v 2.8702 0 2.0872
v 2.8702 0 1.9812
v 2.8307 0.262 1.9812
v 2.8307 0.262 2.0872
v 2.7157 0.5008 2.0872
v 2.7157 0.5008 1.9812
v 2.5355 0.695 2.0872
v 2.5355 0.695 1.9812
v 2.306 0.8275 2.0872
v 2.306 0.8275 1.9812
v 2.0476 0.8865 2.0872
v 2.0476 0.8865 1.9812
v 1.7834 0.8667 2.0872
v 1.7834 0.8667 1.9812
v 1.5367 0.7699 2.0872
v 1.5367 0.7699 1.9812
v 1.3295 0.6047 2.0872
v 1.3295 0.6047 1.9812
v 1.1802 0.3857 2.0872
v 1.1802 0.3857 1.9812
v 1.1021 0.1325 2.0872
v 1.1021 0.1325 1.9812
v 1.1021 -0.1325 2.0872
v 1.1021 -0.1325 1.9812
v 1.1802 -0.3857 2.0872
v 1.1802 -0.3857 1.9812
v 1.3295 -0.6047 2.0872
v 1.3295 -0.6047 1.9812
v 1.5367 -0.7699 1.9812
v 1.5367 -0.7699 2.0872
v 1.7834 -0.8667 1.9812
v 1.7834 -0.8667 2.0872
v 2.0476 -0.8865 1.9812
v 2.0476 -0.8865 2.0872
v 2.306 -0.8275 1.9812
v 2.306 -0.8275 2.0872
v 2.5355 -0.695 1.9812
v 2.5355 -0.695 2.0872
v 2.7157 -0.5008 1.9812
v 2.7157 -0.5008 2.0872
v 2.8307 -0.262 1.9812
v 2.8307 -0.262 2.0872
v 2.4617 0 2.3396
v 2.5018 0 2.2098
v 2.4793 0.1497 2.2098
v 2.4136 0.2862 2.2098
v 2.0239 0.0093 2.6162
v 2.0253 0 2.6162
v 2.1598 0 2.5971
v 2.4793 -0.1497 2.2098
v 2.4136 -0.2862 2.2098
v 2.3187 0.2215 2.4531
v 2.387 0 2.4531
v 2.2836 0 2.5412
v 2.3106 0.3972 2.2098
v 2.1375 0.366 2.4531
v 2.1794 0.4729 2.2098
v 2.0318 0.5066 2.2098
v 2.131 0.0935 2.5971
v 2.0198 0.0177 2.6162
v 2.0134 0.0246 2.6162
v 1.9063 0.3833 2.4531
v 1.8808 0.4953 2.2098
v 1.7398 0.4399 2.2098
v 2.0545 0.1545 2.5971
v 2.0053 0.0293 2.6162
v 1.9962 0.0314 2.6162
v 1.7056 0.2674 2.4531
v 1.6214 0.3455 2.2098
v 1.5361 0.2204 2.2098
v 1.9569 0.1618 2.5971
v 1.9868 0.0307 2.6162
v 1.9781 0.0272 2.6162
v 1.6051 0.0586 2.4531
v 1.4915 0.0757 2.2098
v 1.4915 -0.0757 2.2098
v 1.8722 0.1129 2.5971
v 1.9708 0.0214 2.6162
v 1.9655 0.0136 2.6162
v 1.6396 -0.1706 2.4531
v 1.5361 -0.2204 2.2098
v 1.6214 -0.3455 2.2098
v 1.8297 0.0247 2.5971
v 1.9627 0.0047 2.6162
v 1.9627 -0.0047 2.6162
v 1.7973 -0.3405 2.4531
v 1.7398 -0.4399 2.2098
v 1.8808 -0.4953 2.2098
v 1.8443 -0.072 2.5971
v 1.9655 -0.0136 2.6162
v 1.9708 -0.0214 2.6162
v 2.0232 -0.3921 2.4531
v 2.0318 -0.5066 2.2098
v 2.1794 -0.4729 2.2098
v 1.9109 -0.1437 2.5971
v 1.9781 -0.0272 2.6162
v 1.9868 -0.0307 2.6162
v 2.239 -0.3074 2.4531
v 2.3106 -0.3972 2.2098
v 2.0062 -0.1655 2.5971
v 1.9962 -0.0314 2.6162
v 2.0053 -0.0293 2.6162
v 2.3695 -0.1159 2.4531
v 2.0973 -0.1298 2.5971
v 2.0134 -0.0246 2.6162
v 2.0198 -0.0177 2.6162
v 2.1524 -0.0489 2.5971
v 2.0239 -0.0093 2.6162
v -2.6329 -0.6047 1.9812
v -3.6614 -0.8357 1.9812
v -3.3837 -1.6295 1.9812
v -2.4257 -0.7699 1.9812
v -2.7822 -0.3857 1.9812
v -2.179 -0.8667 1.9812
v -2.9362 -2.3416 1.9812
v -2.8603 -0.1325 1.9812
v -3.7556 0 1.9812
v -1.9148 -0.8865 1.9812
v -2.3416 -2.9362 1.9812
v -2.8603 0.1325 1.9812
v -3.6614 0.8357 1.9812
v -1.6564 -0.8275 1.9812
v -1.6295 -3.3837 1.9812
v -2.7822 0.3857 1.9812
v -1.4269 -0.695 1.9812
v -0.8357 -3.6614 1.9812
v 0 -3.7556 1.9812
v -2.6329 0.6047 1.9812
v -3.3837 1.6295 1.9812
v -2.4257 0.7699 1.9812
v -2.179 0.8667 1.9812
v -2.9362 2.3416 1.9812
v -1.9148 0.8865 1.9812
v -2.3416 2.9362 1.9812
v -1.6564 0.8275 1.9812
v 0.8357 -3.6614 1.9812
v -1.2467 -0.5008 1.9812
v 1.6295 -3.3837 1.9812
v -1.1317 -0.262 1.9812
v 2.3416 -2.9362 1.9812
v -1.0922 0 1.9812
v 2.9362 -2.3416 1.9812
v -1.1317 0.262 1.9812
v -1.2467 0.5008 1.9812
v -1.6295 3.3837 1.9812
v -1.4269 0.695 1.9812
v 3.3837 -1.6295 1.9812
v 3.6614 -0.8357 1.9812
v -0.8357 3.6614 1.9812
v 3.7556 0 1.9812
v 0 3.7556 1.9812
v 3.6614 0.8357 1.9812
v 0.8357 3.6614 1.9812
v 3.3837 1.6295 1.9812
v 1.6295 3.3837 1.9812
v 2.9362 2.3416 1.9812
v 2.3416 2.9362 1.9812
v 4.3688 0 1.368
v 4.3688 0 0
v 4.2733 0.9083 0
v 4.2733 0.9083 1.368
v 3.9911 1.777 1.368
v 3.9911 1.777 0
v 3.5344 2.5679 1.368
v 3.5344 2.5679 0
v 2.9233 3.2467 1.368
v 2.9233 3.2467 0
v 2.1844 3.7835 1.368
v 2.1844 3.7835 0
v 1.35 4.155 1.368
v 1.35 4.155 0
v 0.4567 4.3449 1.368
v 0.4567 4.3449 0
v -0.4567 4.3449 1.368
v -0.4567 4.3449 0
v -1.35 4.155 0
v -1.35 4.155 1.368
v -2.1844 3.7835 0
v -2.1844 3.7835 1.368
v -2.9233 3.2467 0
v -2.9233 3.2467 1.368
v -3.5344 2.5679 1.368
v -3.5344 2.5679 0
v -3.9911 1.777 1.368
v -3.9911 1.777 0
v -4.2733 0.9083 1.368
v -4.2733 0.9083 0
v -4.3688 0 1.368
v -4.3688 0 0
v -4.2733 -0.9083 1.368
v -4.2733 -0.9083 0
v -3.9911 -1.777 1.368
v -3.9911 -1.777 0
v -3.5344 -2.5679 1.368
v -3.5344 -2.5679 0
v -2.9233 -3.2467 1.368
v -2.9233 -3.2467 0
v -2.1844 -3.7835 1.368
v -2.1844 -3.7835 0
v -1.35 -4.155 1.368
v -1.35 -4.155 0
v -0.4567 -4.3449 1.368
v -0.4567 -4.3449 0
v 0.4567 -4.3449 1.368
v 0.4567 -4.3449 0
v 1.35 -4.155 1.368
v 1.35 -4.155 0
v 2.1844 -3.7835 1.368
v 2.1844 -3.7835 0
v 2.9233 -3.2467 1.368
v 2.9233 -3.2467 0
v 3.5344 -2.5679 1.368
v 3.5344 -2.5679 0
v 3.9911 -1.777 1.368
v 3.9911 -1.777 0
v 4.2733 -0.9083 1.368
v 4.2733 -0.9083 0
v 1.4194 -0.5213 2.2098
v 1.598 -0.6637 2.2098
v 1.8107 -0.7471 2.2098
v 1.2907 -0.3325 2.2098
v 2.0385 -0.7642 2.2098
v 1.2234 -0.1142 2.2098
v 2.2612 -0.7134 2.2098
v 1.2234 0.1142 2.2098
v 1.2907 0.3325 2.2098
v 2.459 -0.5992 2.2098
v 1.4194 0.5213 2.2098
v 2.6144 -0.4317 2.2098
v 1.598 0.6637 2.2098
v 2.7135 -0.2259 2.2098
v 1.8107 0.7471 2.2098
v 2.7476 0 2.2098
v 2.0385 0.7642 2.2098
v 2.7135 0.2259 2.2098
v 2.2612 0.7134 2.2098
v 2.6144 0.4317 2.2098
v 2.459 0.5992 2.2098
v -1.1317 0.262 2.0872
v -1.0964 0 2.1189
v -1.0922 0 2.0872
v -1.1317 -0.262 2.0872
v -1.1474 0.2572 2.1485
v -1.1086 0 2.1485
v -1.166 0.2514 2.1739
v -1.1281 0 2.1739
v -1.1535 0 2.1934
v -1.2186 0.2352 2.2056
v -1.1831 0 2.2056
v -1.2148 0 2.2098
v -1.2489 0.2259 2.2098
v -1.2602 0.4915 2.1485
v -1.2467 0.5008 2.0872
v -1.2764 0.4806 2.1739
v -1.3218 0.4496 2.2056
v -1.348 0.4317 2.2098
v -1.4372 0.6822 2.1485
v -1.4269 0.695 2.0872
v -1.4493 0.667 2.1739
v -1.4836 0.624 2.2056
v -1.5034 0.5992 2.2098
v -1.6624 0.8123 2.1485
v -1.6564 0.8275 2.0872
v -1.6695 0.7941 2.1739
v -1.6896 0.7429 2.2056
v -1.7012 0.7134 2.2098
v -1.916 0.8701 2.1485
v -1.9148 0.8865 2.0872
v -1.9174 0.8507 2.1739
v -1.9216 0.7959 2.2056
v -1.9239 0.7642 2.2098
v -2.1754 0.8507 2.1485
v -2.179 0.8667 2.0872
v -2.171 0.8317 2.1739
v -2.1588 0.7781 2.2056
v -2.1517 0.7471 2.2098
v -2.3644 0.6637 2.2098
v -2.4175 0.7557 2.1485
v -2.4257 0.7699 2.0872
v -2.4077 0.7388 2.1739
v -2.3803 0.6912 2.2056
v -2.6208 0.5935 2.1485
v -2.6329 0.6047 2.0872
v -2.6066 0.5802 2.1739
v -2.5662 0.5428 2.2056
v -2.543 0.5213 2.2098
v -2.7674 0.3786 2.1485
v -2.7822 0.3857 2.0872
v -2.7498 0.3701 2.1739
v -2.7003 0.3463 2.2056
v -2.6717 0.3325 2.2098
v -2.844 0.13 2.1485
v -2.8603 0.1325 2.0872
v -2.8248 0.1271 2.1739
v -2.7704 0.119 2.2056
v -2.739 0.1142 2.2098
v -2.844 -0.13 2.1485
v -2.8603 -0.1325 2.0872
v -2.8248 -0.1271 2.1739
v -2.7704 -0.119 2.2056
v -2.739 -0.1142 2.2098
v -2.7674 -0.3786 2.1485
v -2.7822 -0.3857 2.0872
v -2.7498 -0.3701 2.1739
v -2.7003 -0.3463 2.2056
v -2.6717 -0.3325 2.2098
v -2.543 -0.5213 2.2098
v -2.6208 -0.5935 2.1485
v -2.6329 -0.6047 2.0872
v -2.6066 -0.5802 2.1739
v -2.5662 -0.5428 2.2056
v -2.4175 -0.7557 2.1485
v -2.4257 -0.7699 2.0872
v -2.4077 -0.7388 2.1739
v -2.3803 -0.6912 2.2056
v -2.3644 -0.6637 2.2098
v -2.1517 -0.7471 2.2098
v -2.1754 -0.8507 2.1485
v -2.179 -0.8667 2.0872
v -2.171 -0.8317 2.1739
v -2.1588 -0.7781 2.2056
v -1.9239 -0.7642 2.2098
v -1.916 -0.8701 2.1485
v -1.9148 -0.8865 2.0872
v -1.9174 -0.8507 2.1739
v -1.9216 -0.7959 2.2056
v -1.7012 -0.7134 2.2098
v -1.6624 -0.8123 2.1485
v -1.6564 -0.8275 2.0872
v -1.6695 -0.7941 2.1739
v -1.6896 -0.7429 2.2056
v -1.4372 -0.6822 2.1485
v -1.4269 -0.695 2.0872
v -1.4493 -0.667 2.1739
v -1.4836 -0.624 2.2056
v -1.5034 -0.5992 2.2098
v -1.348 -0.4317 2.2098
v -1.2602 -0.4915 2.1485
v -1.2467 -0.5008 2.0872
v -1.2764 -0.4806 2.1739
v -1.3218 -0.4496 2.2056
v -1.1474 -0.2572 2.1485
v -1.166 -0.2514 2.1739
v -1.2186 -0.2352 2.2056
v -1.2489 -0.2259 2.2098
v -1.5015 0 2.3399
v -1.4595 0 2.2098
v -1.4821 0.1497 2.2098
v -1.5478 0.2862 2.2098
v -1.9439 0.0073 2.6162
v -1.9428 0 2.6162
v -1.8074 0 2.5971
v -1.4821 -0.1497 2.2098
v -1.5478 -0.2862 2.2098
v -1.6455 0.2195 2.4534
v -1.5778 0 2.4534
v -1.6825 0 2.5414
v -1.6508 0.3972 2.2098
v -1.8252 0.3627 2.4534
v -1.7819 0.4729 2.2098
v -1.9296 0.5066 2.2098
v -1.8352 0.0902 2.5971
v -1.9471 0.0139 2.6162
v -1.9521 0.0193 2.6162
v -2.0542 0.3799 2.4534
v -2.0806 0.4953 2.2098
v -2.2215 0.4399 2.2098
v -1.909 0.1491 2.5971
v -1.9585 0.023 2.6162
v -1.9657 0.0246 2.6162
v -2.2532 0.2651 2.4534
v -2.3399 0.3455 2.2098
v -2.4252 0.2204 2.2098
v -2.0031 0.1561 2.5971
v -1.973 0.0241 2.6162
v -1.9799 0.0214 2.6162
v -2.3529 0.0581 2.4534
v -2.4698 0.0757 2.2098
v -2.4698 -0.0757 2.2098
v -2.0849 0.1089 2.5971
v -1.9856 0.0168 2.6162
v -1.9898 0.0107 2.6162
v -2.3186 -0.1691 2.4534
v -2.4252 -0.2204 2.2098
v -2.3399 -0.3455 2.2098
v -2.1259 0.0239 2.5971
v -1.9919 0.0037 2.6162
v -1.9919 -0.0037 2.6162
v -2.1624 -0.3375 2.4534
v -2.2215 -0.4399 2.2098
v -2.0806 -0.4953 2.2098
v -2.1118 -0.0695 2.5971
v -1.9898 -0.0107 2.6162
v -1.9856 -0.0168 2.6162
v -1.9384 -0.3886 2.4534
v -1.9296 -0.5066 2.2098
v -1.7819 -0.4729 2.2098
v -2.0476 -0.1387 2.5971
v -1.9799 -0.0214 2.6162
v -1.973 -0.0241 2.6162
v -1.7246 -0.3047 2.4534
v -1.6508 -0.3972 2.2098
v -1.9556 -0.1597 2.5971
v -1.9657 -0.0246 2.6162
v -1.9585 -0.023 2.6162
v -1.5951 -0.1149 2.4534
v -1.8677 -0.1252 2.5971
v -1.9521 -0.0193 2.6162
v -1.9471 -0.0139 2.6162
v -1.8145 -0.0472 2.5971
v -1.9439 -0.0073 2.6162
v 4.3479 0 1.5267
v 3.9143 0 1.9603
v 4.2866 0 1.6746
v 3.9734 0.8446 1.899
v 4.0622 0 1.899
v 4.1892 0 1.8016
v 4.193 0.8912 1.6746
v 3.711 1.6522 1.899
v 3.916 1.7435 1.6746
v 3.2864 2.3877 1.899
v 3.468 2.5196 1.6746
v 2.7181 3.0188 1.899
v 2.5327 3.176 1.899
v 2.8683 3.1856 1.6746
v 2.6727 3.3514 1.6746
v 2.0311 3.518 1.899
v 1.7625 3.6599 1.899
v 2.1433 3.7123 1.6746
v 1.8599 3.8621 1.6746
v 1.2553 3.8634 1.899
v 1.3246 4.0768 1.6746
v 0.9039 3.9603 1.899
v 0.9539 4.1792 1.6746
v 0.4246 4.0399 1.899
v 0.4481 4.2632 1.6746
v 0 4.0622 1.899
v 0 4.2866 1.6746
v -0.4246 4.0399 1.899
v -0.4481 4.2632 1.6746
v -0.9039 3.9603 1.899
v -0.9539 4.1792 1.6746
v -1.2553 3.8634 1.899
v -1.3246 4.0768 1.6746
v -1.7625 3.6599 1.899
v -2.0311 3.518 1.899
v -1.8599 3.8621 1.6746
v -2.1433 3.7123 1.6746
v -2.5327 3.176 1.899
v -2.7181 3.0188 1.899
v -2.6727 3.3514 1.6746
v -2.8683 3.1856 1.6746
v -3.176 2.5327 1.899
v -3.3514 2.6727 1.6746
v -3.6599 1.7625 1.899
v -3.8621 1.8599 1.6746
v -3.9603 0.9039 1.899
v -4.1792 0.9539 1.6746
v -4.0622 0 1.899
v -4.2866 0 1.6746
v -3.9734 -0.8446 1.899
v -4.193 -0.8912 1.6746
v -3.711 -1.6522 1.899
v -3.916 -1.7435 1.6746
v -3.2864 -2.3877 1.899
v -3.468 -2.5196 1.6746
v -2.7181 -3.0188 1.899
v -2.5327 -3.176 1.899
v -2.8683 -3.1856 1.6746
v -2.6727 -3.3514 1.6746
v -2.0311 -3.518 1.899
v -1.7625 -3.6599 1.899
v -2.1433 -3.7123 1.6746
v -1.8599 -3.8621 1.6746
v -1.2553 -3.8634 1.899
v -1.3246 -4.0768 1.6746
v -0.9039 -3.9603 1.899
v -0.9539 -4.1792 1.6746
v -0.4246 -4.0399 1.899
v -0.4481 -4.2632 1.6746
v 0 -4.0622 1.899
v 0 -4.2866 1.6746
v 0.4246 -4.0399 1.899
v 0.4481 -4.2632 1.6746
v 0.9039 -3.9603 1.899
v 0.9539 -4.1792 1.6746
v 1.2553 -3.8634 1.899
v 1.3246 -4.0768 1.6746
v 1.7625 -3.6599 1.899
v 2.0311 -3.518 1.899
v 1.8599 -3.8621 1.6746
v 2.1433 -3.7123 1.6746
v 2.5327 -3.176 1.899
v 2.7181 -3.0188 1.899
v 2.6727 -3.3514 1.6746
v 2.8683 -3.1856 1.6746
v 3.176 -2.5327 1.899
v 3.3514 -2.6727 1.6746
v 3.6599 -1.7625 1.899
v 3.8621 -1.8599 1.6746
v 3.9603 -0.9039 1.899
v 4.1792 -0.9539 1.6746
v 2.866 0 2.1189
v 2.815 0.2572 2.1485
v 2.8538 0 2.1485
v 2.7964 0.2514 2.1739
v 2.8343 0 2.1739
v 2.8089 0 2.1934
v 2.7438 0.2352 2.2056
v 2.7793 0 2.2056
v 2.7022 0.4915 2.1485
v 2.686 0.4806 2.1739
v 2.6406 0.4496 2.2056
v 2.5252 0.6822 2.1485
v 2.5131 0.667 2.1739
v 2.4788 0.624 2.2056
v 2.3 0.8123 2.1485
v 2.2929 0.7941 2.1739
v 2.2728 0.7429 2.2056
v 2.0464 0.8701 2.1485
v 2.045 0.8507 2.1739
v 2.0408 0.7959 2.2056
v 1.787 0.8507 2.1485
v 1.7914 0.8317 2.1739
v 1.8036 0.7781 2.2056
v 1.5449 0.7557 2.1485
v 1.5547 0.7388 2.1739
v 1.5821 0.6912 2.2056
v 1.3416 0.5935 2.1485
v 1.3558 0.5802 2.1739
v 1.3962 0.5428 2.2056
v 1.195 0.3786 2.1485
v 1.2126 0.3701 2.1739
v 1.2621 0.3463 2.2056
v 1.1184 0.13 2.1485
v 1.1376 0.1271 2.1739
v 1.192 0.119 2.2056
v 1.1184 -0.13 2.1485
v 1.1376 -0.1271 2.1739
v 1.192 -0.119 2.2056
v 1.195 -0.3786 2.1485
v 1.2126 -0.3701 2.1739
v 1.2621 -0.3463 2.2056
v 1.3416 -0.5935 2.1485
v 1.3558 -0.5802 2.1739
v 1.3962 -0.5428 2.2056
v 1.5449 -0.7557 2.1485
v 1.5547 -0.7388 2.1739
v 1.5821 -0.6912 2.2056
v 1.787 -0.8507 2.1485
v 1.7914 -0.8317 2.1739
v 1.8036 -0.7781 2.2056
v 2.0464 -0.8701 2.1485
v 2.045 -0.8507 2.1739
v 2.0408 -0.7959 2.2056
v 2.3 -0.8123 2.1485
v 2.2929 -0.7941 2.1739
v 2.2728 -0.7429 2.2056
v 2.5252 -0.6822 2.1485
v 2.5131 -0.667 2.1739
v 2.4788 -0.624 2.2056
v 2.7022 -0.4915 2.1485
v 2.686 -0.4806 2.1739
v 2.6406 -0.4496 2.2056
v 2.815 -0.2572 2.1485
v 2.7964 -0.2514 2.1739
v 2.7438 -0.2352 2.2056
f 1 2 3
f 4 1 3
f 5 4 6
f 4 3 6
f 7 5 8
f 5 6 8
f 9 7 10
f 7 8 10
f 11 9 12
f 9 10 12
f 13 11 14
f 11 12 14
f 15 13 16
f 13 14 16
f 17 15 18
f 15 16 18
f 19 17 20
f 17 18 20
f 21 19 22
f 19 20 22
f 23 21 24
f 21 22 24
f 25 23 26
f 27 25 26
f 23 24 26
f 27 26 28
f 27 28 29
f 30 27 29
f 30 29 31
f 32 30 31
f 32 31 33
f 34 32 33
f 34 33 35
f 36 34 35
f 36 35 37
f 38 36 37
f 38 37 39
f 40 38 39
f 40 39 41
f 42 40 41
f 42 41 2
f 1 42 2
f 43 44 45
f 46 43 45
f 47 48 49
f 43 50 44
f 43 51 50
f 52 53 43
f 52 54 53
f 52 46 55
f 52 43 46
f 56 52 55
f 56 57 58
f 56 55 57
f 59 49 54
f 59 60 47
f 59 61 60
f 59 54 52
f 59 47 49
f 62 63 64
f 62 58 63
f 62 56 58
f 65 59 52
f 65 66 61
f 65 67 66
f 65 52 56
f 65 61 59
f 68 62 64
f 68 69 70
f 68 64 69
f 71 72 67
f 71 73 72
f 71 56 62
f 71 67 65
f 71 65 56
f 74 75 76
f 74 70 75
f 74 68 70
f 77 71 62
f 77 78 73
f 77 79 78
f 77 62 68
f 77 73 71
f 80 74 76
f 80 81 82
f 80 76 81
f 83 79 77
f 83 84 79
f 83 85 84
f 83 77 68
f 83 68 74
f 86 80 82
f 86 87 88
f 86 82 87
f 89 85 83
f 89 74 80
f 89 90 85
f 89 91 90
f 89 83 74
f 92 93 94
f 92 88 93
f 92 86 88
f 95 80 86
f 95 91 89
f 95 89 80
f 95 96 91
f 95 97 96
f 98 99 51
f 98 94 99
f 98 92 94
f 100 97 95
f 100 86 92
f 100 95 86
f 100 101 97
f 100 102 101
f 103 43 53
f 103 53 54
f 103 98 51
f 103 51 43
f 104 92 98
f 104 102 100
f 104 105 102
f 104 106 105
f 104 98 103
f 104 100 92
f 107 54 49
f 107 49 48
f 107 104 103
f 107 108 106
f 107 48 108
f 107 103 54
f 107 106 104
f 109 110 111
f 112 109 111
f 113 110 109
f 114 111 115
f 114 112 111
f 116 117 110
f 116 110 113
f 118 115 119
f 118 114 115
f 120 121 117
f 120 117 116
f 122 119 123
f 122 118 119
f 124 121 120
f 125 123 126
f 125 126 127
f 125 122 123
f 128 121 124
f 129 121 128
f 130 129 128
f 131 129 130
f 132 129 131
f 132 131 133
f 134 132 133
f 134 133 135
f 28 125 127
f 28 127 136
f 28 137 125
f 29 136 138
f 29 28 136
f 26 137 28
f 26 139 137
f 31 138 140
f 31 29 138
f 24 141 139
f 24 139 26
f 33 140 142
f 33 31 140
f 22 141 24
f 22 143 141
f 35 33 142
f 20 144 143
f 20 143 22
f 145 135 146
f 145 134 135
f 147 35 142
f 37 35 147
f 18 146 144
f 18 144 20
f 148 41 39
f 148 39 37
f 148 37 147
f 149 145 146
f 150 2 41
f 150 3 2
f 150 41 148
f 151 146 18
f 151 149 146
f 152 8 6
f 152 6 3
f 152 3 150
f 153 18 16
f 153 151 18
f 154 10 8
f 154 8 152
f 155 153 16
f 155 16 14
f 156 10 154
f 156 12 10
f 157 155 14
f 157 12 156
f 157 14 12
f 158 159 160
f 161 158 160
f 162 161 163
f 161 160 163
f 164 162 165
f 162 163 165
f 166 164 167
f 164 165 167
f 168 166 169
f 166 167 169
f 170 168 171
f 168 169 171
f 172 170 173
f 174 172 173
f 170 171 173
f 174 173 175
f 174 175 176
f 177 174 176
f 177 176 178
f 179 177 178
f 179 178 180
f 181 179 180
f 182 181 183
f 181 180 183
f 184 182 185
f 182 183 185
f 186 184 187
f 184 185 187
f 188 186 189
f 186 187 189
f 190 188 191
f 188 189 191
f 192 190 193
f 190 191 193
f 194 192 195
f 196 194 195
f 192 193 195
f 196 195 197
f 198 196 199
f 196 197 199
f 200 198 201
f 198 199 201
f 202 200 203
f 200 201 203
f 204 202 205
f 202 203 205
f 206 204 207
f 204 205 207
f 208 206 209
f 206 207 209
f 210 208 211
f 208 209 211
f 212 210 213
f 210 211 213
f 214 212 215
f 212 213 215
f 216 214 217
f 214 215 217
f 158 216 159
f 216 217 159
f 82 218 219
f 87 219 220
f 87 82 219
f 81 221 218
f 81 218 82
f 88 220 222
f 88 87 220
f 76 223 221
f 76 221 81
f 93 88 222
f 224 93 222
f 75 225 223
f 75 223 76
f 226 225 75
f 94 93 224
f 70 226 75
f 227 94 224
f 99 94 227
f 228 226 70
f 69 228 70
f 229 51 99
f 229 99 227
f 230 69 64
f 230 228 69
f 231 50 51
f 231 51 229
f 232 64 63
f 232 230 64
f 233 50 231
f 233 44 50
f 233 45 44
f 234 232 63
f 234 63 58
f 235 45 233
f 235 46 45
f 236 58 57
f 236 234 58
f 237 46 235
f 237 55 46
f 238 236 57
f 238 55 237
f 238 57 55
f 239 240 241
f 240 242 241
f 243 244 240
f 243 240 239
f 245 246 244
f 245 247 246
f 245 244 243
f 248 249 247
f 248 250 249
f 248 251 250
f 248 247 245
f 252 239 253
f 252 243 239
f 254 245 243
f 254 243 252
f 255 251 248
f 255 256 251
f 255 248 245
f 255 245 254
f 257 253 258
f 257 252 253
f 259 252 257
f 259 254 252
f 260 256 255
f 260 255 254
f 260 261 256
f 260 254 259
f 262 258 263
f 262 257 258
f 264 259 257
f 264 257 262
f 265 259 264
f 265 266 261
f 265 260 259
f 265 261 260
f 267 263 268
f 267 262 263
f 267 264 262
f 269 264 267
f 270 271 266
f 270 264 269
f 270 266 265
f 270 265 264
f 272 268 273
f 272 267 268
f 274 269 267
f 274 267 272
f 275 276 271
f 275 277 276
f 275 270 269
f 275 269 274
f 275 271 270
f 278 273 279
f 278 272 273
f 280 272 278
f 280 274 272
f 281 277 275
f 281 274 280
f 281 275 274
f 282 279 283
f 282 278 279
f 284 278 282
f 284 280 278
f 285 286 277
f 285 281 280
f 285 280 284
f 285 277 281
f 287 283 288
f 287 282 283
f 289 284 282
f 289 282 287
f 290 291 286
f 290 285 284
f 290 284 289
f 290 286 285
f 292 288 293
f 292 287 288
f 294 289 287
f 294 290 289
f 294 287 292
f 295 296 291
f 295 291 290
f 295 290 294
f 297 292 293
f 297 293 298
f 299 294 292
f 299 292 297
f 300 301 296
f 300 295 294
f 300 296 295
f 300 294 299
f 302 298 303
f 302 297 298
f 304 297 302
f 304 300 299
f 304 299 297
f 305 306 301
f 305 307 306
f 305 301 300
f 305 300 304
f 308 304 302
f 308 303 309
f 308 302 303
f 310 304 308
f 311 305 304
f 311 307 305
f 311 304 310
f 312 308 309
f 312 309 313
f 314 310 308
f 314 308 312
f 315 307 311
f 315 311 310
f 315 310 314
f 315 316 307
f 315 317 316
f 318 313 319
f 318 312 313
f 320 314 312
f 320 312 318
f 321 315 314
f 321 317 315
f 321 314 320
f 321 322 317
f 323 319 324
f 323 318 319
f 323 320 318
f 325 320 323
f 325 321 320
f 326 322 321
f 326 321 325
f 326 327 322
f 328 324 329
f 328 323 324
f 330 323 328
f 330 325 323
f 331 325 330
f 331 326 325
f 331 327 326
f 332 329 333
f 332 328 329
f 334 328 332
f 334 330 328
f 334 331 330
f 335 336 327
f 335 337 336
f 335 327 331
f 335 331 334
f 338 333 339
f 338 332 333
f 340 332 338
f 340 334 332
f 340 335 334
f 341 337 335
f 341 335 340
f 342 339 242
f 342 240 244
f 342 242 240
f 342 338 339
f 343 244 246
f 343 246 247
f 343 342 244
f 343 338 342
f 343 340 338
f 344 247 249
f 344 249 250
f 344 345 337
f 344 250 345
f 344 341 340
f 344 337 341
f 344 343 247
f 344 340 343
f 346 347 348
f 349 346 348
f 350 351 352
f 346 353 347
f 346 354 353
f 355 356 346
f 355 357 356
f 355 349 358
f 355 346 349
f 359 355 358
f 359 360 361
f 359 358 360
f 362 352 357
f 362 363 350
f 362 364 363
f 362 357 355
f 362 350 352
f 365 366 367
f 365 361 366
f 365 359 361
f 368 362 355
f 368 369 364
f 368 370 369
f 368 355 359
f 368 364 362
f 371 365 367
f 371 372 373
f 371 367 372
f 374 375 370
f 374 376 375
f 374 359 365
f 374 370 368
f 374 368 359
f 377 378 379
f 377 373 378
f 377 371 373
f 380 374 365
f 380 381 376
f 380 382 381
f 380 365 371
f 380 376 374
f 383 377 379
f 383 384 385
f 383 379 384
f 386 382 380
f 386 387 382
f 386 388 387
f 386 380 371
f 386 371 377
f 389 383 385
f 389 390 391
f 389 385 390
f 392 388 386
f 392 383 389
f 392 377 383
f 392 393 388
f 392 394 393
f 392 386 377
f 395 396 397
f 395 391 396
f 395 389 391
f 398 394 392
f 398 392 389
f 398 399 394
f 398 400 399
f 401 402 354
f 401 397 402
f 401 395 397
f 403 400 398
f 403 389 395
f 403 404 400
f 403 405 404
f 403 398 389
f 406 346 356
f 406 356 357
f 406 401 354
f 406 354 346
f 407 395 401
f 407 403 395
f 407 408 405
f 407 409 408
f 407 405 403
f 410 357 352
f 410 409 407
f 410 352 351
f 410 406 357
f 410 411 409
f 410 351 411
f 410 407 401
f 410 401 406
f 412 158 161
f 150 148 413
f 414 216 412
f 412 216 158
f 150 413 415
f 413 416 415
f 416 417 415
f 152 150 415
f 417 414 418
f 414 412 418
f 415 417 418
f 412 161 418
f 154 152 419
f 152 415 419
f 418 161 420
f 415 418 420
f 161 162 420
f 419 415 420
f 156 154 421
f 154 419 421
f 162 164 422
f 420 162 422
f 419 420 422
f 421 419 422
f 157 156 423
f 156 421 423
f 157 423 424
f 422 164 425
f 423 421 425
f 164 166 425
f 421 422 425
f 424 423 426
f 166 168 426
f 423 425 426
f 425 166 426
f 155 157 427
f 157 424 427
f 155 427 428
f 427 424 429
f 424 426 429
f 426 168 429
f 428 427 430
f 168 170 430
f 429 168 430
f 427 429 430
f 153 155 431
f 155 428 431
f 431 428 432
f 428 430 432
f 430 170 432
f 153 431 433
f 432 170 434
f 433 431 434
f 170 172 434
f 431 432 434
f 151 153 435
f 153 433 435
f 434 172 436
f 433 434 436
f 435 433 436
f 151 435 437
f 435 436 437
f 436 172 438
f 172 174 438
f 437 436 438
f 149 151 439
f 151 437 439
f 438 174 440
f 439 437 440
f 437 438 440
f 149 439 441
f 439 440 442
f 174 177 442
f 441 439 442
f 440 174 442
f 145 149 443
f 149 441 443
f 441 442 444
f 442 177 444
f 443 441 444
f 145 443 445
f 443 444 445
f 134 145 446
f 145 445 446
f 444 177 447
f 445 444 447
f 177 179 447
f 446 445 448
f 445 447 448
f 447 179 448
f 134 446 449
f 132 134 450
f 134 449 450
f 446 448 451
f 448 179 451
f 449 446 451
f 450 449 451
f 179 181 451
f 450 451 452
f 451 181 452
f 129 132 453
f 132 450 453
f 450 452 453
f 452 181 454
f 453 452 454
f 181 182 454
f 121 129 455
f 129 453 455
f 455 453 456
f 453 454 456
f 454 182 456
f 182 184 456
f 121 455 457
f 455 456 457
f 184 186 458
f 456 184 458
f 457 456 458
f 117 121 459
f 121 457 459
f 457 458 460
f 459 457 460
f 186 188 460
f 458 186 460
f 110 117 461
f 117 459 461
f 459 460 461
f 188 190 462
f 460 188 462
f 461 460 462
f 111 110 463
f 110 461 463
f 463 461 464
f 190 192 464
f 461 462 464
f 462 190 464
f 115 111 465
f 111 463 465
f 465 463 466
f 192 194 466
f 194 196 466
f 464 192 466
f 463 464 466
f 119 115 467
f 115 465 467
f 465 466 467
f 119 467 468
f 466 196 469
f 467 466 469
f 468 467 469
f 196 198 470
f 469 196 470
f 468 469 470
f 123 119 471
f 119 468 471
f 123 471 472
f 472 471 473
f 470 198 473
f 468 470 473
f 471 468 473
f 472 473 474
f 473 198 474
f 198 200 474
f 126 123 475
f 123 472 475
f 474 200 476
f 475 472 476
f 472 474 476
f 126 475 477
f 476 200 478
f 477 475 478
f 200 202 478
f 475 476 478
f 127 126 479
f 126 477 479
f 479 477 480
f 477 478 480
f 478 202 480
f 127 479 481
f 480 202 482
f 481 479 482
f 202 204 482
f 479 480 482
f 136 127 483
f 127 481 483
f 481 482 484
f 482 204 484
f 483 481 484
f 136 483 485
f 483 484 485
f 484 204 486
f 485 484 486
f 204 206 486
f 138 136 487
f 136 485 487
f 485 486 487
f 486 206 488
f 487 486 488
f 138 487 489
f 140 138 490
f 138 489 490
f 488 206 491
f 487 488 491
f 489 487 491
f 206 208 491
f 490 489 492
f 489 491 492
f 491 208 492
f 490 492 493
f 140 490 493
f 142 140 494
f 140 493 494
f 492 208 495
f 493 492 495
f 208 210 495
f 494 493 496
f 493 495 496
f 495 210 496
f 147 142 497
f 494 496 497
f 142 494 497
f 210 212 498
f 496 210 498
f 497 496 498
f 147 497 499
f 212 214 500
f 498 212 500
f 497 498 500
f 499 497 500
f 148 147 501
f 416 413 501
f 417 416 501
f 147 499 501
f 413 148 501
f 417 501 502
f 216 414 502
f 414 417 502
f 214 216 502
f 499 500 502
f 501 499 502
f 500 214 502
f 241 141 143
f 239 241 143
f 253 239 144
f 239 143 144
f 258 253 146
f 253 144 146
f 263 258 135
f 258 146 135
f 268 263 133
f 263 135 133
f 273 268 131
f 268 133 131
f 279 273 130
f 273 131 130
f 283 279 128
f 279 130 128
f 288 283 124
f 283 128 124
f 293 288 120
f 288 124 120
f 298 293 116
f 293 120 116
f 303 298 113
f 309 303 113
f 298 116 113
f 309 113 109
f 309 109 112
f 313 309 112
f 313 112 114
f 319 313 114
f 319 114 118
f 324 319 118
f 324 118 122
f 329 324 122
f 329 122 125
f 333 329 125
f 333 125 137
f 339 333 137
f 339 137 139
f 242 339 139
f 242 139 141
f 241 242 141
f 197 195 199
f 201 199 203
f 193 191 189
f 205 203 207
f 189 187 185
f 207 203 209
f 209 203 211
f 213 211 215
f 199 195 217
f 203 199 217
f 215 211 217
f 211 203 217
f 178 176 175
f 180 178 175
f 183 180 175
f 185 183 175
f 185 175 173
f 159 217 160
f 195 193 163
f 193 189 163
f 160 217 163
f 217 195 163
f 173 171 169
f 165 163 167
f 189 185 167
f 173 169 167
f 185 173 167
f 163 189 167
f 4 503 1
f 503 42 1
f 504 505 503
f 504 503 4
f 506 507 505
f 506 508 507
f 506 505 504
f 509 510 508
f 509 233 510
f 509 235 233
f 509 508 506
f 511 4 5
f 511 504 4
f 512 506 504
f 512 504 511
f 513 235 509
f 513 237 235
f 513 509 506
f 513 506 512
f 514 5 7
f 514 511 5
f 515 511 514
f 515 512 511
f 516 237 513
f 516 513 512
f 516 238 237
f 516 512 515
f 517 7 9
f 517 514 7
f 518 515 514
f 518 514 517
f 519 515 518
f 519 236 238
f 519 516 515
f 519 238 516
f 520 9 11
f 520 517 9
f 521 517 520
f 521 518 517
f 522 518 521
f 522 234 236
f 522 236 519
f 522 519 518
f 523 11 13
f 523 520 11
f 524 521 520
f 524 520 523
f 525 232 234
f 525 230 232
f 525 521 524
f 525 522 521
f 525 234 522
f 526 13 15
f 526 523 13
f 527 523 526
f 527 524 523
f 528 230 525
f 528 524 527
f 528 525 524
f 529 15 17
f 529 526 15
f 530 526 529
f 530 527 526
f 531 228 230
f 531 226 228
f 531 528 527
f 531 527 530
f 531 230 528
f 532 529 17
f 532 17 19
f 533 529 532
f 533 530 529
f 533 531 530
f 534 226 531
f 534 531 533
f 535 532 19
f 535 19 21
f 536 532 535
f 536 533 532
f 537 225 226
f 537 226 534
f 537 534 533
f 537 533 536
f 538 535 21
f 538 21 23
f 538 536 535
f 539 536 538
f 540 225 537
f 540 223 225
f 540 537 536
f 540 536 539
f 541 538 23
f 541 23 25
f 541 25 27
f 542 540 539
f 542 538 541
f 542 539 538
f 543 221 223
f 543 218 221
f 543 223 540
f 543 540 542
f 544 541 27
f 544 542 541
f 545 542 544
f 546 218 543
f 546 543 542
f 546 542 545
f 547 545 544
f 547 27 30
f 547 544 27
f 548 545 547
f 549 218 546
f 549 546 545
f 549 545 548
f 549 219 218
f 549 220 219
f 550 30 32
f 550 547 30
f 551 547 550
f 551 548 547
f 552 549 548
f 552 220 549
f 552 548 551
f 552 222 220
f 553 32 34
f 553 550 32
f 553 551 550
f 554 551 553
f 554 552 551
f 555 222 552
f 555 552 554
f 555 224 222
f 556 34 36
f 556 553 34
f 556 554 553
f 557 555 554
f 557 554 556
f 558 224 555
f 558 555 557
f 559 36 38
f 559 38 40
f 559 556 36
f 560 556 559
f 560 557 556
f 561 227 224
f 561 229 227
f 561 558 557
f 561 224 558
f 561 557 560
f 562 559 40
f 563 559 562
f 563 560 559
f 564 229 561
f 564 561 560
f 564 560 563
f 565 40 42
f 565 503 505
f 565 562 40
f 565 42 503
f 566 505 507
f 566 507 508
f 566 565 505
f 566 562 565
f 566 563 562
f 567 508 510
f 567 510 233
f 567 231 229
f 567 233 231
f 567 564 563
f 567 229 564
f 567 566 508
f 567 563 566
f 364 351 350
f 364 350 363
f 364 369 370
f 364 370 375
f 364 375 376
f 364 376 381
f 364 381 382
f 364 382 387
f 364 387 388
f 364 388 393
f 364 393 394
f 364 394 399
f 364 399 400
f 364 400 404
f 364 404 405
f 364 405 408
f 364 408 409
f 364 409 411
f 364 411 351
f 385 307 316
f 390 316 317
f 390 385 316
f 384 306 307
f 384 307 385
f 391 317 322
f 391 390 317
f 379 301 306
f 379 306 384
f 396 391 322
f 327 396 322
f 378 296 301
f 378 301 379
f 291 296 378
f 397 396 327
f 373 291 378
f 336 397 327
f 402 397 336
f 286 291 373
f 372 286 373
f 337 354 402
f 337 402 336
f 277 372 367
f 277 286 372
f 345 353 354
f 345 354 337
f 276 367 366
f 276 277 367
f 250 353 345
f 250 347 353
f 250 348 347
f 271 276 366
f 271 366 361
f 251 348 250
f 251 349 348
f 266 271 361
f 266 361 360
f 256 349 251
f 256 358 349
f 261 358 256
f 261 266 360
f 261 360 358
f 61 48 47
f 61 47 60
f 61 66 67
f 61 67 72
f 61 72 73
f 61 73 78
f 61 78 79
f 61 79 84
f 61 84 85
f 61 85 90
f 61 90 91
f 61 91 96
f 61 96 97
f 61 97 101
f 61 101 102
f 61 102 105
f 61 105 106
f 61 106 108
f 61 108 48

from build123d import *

# Parameters (mm, degrees)
F0_R     = 4.3688
F1_DEPTH = 1.9812
F2_R     = 0.889
F3_DEPTH = 2.2098
F4_R     = 0.508
F5_DEPTH = 2.6162
F8_R     = 0.122642049
F9_R     = 0.6132102448


# Not quite as in the source:
# - a fillet or chamfer that OpenCascade refuses, or shapes differently, is made with other operations: its cross-section is extruded or revolved along the edge and cut away or added


with BuildPart() as f1:
    # F0 (on Top) → F1 (new body)
    with BuildSketch(Plane.XY):
        Circle(F0_R)
    extrude(amount=F1_DEPTH)

    # F2 (on Top) → F3 (join)
    with BuildSketch(Plane.XY):
        with Locations((-1.9812, 0)):
            Circle(F2_R)
        with Locations((1.9812, 0)):
            Circle(F2_R)
    extrude(amount=F3_DEPTH)

    # F4 (on Top) → F5 (join)
    with BuildSketch(Plane.XY):
        with Locations((-1.9675190561, 0)):
            Circle(F4_R)
        with Locations((1.9938375335, 0)):
            Circle(F4_R)
    extrude(amount=F5_DEPTH)

    # F6: fillet of radius 0.4905681959 on 1 edges, made by hand

    # F6_s1 → F6_t2 (revolve, cut)
    with BuildSketch(Plane.XZ):
        with BuildLine():
            ThreePointArc((-1.4595190561, 2.2098), (-1.6270859561, 2.5010964461), (-1.9428128276, 2.6162))
            Line((-1.9428128276, 2.6162), (-1.4595190561, 2.6162))
            Line((-1.4595190561, 2.6162), (-1.4595190561, 2.2098))
        make_face()
    revolve(axis=Axis((-1.9675190561, 0, 2.6162), (0, 0, 1)), mode=Mode.SUBTRACT)

    # F7: fillet of radius 0.4826 on 1 edges, made by hand

    # F7_s1 → F7_t2 (revolve, cut)
    with BuildSketch(Plane.XZ):
        with BuildLine():
            ThreePointArc((2.5018375335, 2.2098), (2.3384435237, 2.5008035403), (2.0252912923, 2.6162))
            Line((2.0252912923, 2.6162), (2.5018375335, 2.6162))
            Line((2.5018375335, 2.6162), (2.5018375335, 2.2098))
        make_face()
    revolve(axis=Axis((1.9938375335, 0, 2.6162), (0, 0, 1)), mode=Mode.SUBTRACT)

    # F8
    f8_edges = [f1.edges().sort_by_distance(p)[0] for p in [
        (-2.8702, 0, 2.2098),
        (1.0922, 0, 2.2098),
    ]]
    fillet(f8_edges, radius=F8_R)

    # F9
    f9_edges = [f1.edges().sort_by_distance(p)[0] for p in [
        (-4.3688, 0, 1.9812),
    ]]
    fillet(f9_edges, radius=F9_R)


solid = f1.part
